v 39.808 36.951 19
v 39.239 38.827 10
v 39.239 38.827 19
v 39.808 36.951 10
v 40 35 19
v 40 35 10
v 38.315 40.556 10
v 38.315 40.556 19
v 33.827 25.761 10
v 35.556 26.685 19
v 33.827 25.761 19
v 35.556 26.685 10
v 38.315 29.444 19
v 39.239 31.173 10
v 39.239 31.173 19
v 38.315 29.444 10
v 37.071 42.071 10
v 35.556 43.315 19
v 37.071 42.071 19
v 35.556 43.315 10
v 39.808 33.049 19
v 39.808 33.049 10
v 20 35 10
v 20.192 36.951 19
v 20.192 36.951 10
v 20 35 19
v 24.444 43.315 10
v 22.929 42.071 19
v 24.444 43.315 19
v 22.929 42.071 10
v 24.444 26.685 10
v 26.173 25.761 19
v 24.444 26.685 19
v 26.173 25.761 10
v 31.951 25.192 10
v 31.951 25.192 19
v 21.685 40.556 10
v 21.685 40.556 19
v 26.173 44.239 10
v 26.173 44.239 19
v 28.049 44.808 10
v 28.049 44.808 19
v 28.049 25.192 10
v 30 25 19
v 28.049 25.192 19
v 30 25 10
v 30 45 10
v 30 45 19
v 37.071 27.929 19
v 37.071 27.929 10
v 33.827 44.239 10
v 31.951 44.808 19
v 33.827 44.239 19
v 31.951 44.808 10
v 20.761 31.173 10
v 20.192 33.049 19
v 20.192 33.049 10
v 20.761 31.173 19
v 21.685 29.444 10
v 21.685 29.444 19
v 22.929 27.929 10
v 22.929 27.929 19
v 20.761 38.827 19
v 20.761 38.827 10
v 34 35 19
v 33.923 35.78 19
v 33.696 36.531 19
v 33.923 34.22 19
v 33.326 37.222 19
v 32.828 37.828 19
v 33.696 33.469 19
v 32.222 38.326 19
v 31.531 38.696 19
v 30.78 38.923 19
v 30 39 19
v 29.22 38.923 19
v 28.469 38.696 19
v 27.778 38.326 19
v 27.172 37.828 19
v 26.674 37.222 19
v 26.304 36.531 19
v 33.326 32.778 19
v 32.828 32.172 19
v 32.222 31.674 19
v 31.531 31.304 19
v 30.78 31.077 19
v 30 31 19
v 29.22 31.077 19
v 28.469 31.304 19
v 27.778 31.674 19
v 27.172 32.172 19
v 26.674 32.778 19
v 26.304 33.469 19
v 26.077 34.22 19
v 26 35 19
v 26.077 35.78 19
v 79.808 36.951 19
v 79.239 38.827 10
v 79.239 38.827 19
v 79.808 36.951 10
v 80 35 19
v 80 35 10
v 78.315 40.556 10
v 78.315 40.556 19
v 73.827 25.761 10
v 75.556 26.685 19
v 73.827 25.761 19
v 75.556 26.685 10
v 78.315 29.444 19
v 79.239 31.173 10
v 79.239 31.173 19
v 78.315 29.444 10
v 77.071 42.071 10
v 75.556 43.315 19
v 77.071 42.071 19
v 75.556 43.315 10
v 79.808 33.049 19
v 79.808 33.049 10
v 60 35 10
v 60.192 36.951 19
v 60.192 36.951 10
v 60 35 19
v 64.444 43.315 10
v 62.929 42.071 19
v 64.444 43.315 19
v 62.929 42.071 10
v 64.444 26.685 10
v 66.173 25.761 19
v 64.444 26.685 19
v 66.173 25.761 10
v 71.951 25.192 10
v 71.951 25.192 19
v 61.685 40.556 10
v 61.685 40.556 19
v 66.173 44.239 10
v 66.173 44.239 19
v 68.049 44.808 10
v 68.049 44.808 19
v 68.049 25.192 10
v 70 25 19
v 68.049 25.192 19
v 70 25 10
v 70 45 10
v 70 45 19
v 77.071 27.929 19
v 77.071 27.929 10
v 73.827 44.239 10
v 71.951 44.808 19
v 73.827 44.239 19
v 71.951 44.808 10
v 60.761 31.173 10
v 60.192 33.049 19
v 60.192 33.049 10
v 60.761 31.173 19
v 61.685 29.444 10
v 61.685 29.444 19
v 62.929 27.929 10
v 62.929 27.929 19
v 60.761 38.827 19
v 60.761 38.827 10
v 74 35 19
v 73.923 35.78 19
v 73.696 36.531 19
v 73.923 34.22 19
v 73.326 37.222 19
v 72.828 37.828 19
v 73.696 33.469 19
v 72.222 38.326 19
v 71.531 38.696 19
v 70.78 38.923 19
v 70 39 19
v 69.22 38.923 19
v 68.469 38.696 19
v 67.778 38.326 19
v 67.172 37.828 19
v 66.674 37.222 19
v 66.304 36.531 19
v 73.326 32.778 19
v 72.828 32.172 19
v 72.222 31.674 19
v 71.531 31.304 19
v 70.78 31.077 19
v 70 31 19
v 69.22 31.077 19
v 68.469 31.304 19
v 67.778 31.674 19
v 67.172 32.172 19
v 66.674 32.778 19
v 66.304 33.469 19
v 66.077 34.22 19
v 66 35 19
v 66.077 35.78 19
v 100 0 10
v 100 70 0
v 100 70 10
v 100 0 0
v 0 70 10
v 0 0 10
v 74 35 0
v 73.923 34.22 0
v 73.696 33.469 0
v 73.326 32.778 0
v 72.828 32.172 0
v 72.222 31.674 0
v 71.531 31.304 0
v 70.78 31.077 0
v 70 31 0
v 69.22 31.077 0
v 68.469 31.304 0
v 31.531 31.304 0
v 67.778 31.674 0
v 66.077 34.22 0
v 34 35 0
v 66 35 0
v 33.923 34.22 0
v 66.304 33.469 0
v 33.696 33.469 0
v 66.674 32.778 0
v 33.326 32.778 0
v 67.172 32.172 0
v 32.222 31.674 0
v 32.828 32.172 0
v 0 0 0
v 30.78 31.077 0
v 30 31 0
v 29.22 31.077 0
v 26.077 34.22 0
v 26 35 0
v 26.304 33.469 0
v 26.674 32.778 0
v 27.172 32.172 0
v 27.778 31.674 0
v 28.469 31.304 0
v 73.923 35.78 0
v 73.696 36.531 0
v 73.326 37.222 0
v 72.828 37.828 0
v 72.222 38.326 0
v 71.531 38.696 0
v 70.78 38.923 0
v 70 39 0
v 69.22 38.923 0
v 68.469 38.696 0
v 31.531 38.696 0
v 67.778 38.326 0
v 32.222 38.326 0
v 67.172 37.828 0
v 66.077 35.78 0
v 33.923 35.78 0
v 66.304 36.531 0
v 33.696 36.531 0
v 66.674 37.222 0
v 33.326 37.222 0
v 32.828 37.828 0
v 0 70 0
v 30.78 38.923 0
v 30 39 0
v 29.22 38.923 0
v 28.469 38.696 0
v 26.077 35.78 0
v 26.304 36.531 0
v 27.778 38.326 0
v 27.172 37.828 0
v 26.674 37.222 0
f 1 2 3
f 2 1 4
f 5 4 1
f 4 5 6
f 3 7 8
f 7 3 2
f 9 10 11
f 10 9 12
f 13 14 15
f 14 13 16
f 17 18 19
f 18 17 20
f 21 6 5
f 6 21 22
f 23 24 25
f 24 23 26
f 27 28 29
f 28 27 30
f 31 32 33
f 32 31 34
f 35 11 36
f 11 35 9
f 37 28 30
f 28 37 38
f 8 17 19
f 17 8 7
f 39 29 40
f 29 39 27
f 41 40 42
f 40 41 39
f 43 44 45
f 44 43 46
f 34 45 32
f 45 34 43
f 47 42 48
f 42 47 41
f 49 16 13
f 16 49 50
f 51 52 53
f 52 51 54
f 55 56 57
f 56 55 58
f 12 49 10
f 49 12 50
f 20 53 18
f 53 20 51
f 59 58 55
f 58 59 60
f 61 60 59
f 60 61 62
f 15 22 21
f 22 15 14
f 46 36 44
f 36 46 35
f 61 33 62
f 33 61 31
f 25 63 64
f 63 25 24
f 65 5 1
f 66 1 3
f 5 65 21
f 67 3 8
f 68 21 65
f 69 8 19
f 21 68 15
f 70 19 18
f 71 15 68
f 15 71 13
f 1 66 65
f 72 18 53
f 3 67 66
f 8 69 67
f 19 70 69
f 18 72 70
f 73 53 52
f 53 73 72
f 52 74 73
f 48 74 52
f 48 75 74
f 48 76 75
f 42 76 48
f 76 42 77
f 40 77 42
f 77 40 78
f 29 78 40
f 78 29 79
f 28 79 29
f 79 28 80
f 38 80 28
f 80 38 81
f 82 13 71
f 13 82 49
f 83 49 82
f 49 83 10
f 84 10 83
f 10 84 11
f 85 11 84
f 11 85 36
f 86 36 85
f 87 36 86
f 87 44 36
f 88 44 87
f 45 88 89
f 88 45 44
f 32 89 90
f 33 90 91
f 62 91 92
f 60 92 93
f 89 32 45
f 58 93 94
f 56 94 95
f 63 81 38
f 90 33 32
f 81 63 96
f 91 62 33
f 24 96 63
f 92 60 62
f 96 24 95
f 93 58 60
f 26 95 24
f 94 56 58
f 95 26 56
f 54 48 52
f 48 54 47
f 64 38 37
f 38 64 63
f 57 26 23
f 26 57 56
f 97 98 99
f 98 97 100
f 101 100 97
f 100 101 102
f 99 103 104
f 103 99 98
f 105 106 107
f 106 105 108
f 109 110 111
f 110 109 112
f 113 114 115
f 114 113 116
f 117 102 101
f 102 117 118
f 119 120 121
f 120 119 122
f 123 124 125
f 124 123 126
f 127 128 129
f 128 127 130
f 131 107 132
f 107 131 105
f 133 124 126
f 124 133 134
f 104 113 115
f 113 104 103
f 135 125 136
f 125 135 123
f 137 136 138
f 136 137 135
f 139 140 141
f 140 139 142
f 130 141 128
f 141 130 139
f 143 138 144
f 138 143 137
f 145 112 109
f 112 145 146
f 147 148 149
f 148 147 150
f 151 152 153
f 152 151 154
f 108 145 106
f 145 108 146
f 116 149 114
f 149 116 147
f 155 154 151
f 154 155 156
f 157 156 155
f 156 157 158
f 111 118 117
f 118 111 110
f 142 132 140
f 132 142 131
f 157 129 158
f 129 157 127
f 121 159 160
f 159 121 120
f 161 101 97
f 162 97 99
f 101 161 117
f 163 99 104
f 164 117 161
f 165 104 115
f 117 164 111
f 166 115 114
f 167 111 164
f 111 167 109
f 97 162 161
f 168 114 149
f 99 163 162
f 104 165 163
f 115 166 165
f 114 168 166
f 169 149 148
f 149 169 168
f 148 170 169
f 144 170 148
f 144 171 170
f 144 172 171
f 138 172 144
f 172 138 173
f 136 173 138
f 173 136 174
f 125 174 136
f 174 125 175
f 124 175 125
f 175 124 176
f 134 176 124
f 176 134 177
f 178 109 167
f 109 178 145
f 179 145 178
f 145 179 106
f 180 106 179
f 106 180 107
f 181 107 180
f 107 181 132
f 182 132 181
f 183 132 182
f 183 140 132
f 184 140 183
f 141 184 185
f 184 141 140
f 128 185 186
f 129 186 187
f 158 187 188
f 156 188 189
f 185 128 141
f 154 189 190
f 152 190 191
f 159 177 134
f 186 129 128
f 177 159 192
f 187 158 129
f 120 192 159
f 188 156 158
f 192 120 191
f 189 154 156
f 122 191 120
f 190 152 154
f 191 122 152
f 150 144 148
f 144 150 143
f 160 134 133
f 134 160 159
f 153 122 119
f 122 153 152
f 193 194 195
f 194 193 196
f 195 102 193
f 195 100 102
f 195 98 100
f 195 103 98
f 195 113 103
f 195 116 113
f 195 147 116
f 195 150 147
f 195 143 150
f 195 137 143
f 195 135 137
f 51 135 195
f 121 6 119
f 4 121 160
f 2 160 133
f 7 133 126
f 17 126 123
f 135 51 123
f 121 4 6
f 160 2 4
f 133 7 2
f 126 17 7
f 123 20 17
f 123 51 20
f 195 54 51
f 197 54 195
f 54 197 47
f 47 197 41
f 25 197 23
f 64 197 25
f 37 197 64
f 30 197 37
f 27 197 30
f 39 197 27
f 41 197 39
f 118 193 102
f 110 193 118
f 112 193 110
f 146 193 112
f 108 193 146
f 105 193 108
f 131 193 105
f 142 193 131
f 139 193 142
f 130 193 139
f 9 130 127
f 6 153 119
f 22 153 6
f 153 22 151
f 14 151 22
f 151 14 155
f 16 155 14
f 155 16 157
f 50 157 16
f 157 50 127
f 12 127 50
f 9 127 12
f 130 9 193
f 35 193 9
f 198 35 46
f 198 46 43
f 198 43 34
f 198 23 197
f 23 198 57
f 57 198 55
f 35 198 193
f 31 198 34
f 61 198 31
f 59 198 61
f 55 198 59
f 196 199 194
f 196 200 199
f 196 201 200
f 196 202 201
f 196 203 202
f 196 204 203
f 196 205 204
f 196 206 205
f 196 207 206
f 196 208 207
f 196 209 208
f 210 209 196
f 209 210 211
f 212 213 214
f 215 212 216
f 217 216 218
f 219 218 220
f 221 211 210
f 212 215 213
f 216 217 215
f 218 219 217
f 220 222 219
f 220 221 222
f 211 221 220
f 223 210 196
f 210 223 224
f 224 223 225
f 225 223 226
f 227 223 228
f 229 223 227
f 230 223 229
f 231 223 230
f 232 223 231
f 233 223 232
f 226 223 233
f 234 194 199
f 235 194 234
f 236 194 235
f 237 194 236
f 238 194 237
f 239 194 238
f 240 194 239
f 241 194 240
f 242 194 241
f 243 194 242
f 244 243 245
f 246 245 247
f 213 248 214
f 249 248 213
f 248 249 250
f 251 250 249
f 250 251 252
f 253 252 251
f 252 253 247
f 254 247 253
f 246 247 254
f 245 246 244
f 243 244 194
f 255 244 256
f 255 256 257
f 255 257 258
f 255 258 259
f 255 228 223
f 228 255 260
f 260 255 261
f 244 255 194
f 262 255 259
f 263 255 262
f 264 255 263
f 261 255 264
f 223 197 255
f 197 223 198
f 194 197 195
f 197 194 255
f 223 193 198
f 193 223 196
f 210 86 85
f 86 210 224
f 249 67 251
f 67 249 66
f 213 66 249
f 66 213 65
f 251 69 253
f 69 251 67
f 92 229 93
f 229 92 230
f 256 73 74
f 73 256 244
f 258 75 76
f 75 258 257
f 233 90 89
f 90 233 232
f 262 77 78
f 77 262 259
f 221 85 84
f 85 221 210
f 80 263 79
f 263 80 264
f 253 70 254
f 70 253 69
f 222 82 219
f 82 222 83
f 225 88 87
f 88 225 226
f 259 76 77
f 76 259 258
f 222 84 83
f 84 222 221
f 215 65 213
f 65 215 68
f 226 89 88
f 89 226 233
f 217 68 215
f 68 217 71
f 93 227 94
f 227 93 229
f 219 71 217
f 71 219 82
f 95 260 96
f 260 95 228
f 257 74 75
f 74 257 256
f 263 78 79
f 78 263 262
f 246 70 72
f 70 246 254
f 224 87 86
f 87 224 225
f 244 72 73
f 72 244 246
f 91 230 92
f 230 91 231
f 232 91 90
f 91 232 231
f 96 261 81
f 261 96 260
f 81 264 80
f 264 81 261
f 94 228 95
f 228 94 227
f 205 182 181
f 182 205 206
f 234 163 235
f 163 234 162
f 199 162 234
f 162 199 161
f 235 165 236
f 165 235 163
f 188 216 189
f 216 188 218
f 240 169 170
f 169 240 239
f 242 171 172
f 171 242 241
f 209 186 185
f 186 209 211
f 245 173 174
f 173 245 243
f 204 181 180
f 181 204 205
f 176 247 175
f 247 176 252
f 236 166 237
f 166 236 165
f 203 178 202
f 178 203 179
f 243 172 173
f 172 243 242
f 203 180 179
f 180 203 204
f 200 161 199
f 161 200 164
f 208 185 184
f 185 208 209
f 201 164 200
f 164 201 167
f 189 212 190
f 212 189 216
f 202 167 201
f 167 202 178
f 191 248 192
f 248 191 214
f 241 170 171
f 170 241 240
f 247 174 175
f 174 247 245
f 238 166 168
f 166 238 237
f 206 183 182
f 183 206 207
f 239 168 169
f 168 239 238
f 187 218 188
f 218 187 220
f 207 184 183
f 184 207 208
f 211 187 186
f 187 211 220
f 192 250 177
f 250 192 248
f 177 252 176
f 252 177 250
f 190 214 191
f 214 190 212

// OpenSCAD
$fn = 32;

// ----------------------------------------------------------------------
// Drill jig: two_boss jig
// ----------------------------------------------------------------------

// --- parameters (mm) ---
plate_l = 100;            // plate length, X
plate_w = 70;             // plate width, Y
plate_t = 10;             // plate thickness
boss_d = 20;              // guide boss diameter
boss_h = 10;              // boss height above the plate
guide_d = 8;              // guide hole diameter
boss_pitch = 40;          // boss pitch

n_boss = 2;  // guide bosses
boss_x0 = (plate_l - (n_boss - 1) * boss_pitch) / 2;  // first boss X
boss_top = plate_t - 1 + boss_h;  // boss crown height
total_h = boss_top;  // overall height

difference() {
  union() {
  cube([plate_l, plate_w, plate_t]);
  for (i = [0 : n_boss - 1])
    translate([boss_x0 + i * boss_pitch, plate_w / 2, plate_t - 1])
      cylinder(h = boss_h, d = boss_d);
  }
  for (i = [0 : n_boss - 1])
    translate([boss_x0 + i * boss_pitch, plate_w / 2, -1])
      cylinder(h = plate_t + boss_h, d = guide_d);
}
